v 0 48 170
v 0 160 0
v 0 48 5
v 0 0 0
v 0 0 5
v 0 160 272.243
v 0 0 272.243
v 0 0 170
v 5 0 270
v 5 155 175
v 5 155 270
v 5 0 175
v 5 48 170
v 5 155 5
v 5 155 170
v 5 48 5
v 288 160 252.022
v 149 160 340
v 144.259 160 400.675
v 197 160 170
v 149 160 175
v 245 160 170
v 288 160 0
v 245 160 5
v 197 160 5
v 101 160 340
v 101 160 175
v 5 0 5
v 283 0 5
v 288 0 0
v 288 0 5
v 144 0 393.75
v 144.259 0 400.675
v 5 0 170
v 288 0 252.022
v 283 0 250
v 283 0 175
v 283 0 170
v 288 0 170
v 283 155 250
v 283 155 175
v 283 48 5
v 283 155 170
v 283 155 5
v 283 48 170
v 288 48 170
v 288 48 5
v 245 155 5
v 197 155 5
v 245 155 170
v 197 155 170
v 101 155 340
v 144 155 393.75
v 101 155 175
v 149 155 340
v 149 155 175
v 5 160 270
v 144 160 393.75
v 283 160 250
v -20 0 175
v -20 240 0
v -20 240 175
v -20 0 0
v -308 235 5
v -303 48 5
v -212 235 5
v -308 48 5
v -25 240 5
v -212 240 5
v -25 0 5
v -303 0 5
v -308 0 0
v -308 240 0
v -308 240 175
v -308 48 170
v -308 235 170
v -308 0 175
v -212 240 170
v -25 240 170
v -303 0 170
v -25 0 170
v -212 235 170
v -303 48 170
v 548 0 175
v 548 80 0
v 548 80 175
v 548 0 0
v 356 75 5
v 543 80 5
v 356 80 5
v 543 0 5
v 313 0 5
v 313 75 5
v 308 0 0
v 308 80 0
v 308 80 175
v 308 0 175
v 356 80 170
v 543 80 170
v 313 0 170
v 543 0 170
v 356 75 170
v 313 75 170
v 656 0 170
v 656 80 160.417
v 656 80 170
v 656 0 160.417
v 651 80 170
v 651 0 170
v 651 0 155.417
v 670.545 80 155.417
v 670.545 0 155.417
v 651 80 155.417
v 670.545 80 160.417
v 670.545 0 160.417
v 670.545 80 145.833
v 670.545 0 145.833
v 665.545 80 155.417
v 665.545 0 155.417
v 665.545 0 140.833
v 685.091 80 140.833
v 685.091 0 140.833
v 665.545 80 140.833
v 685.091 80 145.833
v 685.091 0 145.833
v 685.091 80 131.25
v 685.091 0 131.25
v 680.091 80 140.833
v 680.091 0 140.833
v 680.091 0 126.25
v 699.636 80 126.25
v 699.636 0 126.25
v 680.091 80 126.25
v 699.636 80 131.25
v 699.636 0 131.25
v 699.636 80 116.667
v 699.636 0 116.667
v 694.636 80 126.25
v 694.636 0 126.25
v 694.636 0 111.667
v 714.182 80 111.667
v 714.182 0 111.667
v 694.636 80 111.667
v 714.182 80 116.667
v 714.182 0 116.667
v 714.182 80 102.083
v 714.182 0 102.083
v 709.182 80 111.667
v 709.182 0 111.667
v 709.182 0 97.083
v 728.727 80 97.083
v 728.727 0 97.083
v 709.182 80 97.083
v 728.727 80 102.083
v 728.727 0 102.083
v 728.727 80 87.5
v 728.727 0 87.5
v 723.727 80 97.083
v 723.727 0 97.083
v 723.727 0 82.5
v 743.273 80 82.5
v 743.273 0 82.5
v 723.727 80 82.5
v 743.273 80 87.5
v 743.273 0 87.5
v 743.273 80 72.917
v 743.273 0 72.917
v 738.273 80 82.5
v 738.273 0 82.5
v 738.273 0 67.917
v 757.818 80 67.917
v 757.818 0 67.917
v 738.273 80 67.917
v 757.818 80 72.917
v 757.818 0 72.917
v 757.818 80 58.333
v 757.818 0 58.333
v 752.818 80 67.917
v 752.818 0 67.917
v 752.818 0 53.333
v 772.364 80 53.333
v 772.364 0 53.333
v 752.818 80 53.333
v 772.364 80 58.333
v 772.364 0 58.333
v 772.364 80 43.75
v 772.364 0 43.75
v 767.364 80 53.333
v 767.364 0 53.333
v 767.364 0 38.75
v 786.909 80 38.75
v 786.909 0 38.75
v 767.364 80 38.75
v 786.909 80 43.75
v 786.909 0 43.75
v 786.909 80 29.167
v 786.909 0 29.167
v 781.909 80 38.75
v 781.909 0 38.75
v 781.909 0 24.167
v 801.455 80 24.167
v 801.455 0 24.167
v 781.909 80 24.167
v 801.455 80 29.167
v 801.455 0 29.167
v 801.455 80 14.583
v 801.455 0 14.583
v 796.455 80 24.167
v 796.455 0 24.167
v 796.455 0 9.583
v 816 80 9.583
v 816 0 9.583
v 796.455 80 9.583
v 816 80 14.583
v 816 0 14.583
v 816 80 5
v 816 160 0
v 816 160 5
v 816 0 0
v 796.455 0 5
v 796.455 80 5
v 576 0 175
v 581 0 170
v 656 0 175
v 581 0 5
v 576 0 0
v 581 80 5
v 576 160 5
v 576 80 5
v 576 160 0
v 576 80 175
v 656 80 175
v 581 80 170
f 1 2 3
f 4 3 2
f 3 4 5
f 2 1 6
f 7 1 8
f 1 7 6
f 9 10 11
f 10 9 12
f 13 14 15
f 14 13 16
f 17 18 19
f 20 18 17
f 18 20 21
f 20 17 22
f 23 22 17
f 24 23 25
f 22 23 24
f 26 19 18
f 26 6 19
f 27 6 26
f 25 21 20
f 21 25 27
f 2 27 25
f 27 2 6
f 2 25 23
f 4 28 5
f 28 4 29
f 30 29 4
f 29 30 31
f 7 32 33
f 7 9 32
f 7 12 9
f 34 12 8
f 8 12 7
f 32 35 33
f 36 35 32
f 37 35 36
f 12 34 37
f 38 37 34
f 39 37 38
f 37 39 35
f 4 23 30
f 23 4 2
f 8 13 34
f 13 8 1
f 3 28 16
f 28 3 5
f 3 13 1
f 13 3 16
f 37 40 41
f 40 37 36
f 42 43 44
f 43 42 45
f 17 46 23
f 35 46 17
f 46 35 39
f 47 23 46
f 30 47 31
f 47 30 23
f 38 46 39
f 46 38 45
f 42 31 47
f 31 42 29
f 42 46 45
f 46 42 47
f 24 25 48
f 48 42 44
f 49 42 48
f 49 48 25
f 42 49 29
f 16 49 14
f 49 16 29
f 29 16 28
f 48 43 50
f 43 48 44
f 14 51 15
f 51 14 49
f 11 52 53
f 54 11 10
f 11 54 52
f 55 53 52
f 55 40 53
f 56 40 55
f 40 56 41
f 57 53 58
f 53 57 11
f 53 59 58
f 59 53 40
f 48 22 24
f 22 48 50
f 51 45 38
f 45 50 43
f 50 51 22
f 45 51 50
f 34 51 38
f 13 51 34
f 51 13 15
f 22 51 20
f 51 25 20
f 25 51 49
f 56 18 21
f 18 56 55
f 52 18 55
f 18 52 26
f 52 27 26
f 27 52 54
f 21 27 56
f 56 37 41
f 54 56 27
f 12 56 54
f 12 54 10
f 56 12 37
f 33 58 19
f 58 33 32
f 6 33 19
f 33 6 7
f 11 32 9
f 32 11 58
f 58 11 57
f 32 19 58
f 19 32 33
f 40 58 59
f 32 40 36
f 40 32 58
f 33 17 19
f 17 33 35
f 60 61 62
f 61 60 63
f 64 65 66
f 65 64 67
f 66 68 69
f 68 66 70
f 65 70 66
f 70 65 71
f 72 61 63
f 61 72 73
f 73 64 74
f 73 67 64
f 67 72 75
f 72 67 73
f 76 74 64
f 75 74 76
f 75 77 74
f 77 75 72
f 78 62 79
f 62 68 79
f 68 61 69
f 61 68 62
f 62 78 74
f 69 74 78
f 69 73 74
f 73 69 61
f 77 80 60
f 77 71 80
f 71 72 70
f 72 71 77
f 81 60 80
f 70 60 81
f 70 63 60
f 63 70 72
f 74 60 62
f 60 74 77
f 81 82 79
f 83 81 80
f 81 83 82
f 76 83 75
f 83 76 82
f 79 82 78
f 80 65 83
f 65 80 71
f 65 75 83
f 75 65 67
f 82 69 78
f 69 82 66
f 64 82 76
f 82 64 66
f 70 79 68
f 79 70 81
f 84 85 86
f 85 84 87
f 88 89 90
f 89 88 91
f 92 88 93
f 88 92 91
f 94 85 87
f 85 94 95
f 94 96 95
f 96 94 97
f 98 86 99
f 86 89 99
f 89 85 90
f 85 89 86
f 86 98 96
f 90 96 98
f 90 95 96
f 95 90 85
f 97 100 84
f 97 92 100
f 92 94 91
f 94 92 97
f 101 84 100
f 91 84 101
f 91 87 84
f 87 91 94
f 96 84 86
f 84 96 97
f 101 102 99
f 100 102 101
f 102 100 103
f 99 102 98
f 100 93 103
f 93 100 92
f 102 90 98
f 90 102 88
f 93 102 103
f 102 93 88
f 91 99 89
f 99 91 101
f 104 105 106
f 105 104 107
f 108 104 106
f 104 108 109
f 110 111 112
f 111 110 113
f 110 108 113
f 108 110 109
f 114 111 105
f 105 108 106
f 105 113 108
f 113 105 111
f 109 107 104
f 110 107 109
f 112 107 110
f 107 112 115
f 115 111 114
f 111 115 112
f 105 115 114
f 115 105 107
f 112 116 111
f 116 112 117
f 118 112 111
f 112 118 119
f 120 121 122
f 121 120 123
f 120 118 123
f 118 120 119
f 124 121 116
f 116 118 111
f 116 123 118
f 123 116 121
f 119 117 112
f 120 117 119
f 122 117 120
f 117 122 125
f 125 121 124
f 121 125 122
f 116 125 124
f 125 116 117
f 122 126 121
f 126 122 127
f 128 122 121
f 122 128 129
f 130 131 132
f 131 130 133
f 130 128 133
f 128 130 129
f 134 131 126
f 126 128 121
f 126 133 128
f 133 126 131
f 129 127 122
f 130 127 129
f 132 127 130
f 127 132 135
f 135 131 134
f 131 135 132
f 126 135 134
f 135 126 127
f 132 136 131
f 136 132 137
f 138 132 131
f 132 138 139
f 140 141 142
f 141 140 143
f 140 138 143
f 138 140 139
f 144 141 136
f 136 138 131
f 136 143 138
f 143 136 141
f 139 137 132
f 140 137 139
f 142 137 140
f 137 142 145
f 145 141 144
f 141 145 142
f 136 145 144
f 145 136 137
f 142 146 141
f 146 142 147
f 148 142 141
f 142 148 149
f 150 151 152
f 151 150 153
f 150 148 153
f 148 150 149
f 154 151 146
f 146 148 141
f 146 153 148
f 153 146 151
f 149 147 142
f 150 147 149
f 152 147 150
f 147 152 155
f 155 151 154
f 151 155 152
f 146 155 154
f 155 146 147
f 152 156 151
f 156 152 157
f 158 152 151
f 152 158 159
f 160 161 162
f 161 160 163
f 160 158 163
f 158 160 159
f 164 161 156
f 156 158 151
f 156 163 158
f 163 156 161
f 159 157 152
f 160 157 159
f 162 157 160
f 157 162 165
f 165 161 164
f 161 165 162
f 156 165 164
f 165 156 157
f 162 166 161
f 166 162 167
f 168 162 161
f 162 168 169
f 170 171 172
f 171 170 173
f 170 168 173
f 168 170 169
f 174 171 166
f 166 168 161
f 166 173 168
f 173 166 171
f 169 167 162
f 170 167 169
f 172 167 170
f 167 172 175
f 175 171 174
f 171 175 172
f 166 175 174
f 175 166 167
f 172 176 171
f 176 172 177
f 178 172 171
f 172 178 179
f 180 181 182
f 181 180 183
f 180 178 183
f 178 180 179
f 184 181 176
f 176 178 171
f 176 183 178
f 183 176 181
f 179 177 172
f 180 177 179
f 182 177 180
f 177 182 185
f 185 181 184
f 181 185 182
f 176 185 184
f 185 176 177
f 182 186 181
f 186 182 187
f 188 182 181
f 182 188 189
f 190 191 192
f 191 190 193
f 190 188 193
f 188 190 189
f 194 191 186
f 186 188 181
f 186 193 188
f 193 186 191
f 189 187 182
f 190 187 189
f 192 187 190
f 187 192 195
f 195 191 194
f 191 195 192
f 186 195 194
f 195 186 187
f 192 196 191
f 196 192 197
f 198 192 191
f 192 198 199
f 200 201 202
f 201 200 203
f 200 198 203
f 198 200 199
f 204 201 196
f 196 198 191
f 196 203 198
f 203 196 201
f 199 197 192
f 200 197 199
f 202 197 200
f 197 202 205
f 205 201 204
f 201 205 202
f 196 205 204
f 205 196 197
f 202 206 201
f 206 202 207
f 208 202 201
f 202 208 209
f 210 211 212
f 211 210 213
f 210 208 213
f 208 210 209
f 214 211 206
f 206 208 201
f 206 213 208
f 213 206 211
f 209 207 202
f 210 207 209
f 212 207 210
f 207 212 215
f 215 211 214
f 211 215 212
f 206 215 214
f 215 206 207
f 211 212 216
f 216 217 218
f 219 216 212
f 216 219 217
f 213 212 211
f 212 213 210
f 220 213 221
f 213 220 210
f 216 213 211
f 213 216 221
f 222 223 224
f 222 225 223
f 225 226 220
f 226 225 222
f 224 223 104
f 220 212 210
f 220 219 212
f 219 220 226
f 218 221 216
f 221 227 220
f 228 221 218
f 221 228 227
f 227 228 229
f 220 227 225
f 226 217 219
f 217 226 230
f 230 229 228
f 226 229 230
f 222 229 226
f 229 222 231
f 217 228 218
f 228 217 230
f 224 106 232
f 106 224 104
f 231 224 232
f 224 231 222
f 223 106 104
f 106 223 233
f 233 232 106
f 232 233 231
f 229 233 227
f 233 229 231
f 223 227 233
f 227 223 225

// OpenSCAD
include <parameters.scad>;
include <main.scad>;
include <room1.scad>;
include <room2.scad>;
include <stairs.scad>;

Main(D, 2 * x);

translate([-D - 20, 0, 0]) {
	Room1(D, 3 * x);
}

translate([D + 20, 0, 0]) {
	Room2(L, x);
}

translate([2 * D, 0, 0]) {
	Stairs(L, 2 * x);
}
